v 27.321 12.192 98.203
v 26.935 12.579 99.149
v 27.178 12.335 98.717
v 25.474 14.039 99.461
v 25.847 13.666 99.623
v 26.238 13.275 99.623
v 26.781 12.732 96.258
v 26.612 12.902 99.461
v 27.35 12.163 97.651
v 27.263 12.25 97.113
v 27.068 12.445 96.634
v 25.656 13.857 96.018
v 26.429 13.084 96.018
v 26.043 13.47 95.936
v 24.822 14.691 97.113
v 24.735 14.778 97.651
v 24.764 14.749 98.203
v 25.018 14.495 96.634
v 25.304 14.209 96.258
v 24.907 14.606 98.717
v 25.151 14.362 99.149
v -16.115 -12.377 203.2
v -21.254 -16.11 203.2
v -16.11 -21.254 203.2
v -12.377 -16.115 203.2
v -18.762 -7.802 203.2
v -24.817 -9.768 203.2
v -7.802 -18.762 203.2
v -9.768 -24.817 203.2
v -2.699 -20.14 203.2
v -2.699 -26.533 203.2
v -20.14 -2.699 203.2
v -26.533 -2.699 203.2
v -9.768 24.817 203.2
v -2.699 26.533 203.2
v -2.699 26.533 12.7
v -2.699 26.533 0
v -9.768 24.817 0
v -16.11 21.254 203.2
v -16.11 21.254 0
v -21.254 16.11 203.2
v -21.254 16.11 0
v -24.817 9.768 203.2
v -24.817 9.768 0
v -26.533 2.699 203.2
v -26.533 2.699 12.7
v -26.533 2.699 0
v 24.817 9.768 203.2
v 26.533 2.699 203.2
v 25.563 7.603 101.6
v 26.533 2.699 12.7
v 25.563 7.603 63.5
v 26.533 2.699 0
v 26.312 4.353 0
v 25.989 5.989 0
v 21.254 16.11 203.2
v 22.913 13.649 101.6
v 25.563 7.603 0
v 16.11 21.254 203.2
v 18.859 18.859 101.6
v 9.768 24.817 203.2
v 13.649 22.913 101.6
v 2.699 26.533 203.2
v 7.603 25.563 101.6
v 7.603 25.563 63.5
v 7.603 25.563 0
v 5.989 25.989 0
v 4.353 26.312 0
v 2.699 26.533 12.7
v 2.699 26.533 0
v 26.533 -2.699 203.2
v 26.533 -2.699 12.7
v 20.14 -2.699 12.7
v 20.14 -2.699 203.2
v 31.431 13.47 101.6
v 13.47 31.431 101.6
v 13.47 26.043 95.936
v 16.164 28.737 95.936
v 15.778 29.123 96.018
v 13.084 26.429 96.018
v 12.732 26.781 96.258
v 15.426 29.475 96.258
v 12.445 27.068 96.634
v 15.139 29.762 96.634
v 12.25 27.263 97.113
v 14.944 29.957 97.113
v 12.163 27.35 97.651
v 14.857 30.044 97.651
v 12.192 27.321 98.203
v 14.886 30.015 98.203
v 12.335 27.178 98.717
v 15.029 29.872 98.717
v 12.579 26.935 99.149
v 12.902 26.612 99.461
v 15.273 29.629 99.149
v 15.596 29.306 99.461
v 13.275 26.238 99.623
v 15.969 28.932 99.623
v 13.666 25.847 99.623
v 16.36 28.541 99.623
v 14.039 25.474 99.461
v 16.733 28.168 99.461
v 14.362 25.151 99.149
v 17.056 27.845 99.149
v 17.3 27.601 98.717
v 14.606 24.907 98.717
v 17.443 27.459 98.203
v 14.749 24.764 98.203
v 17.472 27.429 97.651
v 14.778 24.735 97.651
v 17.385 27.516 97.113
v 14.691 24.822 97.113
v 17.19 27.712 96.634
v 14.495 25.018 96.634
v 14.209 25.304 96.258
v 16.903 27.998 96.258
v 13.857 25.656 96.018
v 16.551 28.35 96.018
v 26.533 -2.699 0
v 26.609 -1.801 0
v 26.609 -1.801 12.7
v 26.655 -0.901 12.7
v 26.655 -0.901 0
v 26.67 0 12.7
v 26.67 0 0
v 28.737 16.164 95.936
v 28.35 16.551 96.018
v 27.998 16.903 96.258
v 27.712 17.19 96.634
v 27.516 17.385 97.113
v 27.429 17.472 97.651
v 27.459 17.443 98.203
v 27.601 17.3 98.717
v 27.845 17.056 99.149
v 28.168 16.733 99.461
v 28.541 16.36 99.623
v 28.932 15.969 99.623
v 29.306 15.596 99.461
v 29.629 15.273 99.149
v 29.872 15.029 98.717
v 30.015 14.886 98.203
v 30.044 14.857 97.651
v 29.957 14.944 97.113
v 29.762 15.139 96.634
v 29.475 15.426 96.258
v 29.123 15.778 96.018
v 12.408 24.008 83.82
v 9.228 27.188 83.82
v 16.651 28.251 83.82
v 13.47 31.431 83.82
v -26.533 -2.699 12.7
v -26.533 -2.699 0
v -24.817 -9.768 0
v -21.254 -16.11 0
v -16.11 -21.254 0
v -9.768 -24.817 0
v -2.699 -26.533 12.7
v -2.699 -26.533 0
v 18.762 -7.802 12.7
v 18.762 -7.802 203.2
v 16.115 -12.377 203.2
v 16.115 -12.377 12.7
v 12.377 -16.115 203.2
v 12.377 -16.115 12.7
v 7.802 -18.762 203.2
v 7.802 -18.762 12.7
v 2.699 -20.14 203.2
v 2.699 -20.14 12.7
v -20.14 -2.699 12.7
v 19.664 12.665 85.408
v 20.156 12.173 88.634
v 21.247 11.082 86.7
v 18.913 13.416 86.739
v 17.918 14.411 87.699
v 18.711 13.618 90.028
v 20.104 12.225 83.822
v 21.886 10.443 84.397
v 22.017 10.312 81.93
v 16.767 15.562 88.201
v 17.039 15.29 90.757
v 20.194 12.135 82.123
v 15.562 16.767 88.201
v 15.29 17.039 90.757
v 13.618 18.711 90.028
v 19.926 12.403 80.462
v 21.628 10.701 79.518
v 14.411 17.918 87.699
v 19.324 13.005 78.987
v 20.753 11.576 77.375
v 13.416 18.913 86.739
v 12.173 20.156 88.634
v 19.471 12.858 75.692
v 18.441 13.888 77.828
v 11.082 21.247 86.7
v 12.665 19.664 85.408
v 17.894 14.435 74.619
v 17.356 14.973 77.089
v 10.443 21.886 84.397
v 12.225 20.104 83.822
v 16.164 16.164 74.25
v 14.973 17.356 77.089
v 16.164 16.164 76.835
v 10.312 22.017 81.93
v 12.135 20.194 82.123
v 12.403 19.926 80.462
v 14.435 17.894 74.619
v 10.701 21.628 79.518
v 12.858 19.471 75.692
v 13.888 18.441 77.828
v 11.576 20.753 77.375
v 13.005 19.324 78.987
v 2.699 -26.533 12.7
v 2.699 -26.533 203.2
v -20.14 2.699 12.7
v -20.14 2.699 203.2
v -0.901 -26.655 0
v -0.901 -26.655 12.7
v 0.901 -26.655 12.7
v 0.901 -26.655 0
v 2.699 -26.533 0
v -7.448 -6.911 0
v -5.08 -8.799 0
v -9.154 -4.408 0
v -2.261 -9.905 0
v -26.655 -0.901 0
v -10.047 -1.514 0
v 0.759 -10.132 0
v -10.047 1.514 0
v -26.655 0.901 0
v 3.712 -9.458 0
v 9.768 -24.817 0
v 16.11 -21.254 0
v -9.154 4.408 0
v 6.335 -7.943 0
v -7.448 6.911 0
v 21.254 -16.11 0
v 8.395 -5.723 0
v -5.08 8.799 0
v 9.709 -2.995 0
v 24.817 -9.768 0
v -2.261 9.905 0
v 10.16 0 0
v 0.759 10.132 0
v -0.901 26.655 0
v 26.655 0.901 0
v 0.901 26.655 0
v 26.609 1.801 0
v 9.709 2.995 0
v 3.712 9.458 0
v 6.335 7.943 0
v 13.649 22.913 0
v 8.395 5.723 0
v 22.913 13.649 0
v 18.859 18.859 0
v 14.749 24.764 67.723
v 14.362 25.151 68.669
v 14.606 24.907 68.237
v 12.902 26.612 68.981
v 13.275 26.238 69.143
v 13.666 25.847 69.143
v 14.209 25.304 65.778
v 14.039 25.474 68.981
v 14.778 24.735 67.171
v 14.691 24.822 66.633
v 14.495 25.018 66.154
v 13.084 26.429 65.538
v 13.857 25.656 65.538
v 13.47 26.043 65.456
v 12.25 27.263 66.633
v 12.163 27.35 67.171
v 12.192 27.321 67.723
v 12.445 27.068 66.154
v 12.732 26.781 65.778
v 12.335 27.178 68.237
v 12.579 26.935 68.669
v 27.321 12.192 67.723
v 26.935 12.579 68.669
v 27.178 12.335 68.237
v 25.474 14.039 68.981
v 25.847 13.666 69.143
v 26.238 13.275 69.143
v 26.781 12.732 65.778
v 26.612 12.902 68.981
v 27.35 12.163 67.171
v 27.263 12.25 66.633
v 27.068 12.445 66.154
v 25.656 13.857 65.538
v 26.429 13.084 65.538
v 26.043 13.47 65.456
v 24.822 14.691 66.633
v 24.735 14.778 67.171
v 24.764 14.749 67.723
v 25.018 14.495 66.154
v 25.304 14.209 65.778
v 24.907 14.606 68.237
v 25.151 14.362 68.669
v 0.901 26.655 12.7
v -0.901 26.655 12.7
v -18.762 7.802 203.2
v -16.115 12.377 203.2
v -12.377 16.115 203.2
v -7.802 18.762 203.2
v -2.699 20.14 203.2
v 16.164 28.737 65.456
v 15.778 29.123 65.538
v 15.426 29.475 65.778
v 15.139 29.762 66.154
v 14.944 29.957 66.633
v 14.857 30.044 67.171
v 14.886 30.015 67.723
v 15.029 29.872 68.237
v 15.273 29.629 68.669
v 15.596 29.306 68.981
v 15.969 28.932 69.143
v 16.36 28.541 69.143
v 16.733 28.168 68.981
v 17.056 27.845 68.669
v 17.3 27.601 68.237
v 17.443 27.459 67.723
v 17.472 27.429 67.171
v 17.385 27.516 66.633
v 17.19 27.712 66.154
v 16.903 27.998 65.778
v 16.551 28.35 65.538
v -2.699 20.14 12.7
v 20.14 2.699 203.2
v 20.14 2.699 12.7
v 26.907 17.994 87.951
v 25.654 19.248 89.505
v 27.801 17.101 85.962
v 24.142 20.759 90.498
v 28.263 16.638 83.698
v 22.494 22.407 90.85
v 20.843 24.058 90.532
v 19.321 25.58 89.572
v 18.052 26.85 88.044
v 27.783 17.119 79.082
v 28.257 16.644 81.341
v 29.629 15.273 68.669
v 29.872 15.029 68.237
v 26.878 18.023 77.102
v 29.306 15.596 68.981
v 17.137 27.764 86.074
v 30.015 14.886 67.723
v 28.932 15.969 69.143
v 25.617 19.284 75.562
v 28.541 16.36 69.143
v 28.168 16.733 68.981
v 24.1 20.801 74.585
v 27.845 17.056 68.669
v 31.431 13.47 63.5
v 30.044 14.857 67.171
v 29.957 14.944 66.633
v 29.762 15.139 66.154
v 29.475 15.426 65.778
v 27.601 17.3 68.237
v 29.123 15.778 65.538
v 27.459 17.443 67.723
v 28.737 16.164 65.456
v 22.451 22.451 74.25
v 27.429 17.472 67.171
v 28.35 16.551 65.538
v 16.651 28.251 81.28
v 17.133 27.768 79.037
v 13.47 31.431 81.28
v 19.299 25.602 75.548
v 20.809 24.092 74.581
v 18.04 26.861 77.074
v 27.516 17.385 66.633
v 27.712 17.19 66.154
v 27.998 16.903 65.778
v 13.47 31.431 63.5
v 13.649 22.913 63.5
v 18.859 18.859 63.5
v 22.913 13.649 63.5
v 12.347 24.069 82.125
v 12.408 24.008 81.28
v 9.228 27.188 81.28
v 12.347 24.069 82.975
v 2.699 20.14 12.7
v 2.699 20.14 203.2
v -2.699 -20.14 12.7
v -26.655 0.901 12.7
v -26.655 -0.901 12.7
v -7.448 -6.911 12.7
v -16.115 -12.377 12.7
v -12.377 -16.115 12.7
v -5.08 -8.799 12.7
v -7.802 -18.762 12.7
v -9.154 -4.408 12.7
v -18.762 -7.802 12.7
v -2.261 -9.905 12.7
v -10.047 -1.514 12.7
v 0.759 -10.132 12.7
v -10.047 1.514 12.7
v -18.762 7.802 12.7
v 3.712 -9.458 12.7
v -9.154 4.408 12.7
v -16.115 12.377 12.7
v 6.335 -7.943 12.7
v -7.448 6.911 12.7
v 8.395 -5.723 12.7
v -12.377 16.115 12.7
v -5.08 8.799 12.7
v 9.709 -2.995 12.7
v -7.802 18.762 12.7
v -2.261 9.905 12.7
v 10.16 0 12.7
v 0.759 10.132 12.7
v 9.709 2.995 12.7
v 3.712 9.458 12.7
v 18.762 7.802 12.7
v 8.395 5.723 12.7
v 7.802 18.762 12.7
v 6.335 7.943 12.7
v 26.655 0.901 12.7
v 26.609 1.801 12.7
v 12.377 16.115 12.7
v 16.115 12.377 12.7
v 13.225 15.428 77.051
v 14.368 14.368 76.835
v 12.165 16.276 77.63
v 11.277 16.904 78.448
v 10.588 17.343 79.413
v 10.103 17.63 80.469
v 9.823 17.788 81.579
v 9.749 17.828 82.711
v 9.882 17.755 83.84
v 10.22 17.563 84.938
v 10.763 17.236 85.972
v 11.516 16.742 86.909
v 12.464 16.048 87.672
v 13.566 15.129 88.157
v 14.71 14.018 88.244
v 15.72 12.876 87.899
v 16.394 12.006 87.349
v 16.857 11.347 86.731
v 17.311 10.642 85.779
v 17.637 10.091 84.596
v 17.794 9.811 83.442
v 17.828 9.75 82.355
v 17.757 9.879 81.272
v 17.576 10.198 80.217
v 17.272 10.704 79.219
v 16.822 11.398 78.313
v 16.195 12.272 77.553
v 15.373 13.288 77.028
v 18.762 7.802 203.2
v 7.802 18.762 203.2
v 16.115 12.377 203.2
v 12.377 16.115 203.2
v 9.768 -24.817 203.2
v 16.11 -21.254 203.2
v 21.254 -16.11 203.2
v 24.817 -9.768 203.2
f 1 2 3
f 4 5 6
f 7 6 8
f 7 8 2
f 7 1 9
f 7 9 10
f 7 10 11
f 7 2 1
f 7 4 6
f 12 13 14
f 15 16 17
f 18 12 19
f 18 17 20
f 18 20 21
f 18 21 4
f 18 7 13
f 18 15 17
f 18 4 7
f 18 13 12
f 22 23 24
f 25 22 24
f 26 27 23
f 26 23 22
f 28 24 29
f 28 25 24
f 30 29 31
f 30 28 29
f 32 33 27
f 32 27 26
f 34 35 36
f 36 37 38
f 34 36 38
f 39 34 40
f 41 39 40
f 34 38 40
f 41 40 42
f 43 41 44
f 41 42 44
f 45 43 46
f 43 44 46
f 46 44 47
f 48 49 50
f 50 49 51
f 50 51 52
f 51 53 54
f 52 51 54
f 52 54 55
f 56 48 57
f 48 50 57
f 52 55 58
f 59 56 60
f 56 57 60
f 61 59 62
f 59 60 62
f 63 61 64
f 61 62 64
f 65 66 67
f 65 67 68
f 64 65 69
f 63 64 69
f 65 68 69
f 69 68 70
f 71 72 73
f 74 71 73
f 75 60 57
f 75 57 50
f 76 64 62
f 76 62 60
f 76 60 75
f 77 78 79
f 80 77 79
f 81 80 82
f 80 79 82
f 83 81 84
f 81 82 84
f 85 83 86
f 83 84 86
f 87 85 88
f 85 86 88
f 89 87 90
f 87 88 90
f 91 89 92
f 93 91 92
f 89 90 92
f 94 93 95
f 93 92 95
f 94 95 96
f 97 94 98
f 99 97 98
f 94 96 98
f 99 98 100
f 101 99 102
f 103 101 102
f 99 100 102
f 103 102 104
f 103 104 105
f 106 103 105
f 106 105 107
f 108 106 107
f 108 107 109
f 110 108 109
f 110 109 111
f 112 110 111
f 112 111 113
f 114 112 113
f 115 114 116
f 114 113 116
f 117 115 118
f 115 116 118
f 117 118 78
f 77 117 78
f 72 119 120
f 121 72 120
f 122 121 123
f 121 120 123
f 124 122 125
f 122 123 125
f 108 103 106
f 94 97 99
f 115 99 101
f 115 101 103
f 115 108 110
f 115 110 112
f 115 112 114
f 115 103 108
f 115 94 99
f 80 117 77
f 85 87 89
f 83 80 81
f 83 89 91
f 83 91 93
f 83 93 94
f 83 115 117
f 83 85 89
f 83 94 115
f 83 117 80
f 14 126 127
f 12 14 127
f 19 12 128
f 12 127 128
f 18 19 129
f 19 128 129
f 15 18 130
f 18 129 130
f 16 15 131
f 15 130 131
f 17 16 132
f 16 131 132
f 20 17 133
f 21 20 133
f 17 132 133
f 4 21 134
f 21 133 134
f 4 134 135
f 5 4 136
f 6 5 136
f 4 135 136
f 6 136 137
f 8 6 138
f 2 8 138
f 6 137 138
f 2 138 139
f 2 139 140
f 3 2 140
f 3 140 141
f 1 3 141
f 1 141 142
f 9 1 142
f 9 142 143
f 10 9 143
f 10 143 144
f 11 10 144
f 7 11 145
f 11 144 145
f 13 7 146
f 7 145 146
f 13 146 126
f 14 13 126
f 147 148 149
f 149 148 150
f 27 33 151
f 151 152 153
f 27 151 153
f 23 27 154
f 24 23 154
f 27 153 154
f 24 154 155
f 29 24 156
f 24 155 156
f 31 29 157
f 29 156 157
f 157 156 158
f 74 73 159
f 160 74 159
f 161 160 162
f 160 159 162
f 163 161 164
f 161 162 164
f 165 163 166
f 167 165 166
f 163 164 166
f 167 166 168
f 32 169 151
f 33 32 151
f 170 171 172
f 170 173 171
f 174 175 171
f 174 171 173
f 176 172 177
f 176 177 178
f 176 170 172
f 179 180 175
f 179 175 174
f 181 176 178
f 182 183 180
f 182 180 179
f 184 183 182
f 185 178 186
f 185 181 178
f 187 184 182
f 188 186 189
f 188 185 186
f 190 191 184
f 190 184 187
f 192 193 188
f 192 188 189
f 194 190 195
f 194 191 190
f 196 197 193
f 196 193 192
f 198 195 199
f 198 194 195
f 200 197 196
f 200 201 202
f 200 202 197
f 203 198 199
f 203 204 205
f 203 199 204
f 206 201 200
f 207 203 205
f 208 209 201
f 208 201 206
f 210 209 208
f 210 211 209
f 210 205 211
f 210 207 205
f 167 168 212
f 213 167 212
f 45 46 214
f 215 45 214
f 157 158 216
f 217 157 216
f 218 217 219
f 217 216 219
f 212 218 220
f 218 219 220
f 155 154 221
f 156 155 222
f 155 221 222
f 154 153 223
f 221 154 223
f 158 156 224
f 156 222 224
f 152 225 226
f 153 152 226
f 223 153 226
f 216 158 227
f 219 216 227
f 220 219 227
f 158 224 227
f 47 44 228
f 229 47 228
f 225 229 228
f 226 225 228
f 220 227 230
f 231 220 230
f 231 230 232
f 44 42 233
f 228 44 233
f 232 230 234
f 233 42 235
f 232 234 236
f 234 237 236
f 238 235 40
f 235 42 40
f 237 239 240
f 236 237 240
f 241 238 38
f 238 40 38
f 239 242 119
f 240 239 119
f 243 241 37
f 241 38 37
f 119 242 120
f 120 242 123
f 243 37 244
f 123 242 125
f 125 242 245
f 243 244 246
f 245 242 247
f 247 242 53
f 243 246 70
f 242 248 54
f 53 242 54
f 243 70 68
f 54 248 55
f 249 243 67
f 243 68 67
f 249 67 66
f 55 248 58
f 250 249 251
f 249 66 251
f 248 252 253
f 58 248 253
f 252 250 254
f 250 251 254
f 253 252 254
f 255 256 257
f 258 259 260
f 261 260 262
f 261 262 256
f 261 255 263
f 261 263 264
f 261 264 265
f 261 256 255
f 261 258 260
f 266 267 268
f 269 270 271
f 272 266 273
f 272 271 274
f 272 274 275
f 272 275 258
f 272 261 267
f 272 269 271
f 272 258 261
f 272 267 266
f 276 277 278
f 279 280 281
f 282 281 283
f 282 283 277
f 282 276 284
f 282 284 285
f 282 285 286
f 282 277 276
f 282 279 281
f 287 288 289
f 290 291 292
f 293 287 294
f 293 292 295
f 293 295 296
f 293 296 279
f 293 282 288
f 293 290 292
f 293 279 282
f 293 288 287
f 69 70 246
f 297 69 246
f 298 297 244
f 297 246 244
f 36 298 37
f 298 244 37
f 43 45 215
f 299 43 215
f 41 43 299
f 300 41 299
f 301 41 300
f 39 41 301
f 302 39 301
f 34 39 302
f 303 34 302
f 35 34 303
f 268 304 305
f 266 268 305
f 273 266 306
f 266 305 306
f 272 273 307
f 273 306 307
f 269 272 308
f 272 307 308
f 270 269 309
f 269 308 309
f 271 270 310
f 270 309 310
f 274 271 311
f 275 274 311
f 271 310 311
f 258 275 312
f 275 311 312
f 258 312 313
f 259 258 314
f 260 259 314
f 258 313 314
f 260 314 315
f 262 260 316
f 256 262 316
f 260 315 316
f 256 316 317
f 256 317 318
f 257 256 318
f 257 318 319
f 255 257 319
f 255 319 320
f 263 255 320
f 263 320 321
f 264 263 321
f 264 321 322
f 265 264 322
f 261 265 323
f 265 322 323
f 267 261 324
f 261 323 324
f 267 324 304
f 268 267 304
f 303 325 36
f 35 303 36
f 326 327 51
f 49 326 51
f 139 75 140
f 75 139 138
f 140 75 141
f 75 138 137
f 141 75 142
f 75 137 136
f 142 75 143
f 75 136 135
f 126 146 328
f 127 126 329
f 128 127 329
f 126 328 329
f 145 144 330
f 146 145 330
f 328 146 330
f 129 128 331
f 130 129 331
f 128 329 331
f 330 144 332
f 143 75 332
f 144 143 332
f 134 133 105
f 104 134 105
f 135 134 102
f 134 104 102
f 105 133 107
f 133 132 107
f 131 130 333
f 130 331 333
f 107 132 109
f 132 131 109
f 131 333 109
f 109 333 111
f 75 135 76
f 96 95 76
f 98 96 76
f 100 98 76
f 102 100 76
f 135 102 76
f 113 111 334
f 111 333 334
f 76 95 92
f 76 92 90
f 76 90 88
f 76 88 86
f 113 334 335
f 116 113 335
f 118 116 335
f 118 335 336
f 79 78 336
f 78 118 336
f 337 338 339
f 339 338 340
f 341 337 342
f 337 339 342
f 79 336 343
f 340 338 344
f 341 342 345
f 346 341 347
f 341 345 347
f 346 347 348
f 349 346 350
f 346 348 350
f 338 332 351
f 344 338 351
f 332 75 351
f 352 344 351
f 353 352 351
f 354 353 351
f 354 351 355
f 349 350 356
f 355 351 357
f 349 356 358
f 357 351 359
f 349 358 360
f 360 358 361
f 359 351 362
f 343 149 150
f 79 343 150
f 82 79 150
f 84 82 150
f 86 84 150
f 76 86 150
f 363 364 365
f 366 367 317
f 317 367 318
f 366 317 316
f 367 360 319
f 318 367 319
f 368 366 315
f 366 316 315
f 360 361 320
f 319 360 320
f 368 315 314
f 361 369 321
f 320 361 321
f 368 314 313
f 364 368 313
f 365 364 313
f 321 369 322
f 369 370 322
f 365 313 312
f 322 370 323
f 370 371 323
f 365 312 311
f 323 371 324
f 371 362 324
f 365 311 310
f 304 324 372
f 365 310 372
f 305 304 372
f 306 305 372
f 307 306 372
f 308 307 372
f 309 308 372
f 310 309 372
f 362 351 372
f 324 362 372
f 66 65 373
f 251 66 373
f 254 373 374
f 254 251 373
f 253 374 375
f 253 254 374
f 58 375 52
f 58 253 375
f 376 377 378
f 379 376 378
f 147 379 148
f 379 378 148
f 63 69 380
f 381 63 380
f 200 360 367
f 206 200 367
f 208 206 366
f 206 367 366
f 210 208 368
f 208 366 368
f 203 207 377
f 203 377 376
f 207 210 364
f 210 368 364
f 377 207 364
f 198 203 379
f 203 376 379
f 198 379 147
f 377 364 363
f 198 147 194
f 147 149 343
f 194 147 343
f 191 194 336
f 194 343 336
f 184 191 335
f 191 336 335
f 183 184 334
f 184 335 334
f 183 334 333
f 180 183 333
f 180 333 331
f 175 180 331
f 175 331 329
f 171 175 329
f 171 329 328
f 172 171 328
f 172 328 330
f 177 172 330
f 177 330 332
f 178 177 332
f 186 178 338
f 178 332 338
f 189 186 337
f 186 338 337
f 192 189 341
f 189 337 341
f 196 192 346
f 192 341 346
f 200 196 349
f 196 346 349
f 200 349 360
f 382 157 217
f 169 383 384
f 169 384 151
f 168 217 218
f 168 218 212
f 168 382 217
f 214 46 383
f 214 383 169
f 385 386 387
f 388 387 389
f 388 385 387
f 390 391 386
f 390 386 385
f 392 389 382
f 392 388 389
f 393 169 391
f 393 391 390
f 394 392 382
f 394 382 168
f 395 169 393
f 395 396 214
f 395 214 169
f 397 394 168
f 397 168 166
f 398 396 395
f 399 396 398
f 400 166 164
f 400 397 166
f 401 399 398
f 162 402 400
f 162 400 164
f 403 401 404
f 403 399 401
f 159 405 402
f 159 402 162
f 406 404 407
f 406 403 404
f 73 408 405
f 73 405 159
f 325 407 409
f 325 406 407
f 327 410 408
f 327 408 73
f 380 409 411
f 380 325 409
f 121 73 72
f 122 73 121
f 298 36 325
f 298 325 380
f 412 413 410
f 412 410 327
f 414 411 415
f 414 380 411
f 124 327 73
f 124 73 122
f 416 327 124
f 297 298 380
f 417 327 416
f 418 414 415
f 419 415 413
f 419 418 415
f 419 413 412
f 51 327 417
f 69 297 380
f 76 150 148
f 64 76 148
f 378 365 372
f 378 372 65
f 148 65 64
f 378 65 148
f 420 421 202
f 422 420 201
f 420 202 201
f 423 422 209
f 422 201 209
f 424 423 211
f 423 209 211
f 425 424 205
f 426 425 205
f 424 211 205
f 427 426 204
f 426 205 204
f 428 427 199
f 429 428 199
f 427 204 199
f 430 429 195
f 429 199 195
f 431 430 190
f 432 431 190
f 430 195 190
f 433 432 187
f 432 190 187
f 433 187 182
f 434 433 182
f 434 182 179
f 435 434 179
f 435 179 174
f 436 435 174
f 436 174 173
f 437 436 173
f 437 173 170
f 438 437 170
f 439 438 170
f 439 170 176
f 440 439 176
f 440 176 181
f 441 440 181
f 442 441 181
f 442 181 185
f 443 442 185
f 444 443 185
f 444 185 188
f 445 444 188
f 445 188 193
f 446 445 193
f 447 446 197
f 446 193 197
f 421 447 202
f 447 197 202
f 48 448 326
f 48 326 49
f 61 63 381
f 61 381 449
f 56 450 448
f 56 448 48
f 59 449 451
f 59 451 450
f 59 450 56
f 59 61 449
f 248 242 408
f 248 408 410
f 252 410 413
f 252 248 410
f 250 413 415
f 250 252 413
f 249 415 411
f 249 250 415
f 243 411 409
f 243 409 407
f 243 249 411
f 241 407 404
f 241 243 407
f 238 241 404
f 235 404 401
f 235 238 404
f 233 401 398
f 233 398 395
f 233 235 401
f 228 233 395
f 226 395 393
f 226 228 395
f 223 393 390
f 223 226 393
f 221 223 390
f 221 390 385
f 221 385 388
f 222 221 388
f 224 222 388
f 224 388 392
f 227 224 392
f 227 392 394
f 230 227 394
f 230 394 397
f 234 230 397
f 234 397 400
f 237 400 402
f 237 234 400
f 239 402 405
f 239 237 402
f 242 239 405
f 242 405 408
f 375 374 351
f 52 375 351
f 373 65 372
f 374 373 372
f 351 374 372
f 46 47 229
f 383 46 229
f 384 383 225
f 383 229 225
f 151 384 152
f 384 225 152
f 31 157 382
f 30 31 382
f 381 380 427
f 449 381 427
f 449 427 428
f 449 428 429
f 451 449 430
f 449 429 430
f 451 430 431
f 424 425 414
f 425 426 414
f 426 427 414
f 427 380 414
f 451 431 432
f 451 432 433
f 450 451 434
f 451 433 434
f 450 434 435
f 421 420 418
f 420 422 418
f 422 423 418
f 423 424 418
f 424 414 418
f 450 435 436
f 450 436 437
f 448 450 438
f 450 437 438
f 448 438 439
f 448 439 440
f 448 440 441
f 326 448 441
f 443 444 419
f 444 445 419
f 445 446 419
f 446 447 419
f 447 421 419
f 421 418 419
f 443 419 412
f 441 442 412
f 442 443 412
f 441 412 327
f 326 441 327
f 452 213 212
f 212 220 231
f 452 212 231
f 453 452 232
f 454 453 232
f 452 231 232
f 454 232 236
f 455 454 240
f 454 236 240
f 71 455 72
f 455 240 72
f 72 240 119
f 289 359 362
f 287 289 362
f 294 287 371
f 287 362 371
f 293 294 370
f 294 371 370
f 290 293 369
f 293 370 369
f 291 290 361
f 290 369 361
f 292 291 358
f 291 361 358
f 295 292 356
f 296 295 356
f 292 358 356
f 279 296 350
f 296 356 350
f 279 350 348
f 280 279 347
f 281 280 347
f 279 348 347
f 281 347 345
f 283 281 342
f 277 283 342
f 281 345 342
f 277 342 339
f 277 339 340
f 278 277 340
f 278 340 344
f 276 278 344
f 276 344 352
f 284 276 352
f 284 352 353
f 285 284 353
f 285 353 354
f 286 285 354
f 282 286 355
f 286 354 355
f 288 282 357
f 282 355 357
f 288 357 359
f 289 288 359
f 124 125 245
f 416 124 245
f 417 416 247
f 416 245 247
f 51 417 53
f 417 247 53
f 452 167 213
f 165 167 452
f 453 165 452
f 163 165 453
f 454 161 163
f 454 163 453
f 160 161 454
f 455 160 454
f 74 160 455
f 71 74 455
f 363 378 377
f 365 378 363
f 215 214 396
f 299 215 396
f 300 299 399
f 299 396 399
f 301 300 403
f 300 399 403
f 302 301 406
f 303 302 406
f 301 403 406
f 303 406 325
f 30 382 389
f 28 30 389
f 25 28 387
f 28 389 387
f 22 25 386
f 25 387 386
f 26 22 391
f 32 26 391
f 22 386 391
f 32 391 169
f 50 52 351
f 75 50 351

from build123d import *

# Parameters (mm, degrees)
BOSS_EXTRUDE2_DEPTH   = 203.2
BOSS_EXTRUDE2_2_DEPTH = 203.2
BOSS_EXTRUDE2_3_DEPTH = 203.2
BOSS_EXTRUDE2_4_DEPTH = 203.2
SKETCH1_15_R          = 26.67
SKETCH1_15_R_2        = 10.16
BOSS_EXTRUDE3_DEPTH   = 12.7
BOSS_EXTRUDE4_DEPTH   = 101.6
CUT_EXTRUDE2_DEPTH    = 63.5
SKETCH4_R             = 8.300000037
CUT_EXTRUDE3_DEPTH    = 8.89
SKETCH5_R             = 5.715
CUT_EXTRUDE5_DEPTH    = 25.4
SKETCH7_W             = 2.54
SKETCH7_H             = 6
CUT_EXTRUDE6_DEPTH    = 8.89
SKETCH8_R             = 1.8542
CUT_EXTRUDE7_DEPTH    = 3.81


with BuildPart() as part:
    # Sketch1 → Boss-Extrude2 (new body)
    with BuildSketch(Plane.XY):
        with BuildLine():
            Line((-26.533104764, 2.69875), (-20.139988789, 2.69875))
            ThreePointArc((-20.139988789, 2.69875), (-14.368409794, 14.368409794), (-2.69875, 20.139988789))
            Line((-2.69875, 20.139988789), (-2.69875, 26.533104764))
            ThreePointArc((-2.69875, 26.533104764), (-18.858537854, 18.858537854), (-26.533104764, 2.69875))
        make_face()
    extrude(amount=BOSS_EXTRUDE2_DEPTH)



with BuildPart() as body_2:
    # Sketch1 → Boss-Extrude2 2 (new body)
    with BuildSketch(Plane.XY):
        with BuildLine():
            ThreePointArc((-2.69875, -20.139988789), (-14.368409794, -14.368409794), (-20.139988789, -2.69875))
            Line((-20.139988789, -2.69875), (-26.533104764, -2.69875))
            ThreePointArc((-26.533104764, -2.69875), (-18.858537854, -18.858537854), (-2.69875, -26.533104764))
            Line((-2.69875, -26.533104764), (-2.69875, -20.139988789))
        make_face()
    extrude(amount=BOSS_EXTRUDE2_2_DEPTH)


with BuildPart() as body_3:
    # Sketch1 → Boss-Extrude2 3 (new body)
    with BuildSketch(Plane.XY):
        with BuildLine():
            Line((2.69875, 26.533104764), (2.69875, 20.139988789))
            ThreePointArc((2.69875, 20.139988789), (14.368409794, 14.368409794), (20.139988789, 2.69875))
            Line((20.139988789, 2.69875), (26.533104764, 2.69875))
            ThreePointArc((26.533104764, 2.69875), (18.858537854, 18.858537854), (2.69875, 26.533104764))
        make_face()
    extrude(amount=BOSS_EXTRUDE2_3_DEPTH)


with BuildPart() as body_4:
    # Sketch1 → Boss-Extrude2 4 (new body)
    with BuildSketch(Plane.XY):
        with BuildLine():
            ThreePointArc((20.139988789, -2.69875), (14.368409794, -14.368409794), (2.69875, -20.139988789))
            Line((2.69875, -20.139988789), (2.69875, -26.533104764))
            ThreePointArc((2.69875, -26.533104764), (18.858537854, -18.858537854), (26.533104764, -2.69875))
            Line((26.533104764, -2.69875), (20.139988789, -2.69875))
        make_face()
    extrude(amount=BOSS_EXTRUDE2_4_DEPTH)


with BuildPart() as part_1:
    add(part.part)

    add(body_2.part)  # Boss-Extrude3 merges body 2

    add(body_3.part)  # Boss-Extrude3 merges body 3

    add(body_4.part)  # Boss-Extrude3 merges body 4
    # Sketch1<15> → Boss-Extrude3 (add)
    with BuildSketch(Plane.XY):
        Circle(SKETCH1_15_R)
        Circle(SKETCH1_15_R_2, mode=Mode.SUBTRACT)
    extrude(amount=BOSS_EXTRUDE3_DEPTH)

    # Sketch1<18> → Boss-Extrude4 (add)
    with BuildSketch(Plane.XY):
        with BuildLine():
            Line((13.470384182, 31.430896424), (7.602851248, 25.56336349))
            ThreePointArc((7.602851248, 25.56336349), (18.858537854, 18.858537854), (25.56336349, 7.602851248))
            Line((25.56336349, 7.602851248), (31.430896424, 13.470384182))
            Line((31.430896424, 13.470384182), (13.470384182, 31.430896424))
        make_face()
    extrude(amount=BOSS_EXTRUDE4_DEPTH)

    # Sketch1<19> → Cut-Extrude2 (cut)
    with BuildSketch(Plane.XY):
        with BuildLine():
            Line((13.470384182, 31.430896424), (7.602851248, 25.56336349))
            ThreePointArc((7.602851248, 25.56336349), (18.858537854, 18.858537854), (25.56336349, 7.602851248))
            Line((25.56336349, 7.602851248), (31.430896424, 13.470384182))
            Line((31.430896424, 13.470384182), (13.470384182, 31.430896424))
        make_face()
    extrude(amount=CUT_EXTRUDE2_DEPTH, mode=Mode.SUBTRACT)

    # Sketch4 → Cut-Extrude3 (cut)
    with BuildSketch(Plane(origin=(22.450640303, 22.450640303, 0), x_dir=(0, 0, -1), z_dir=(0.7071067811865466, 0.7071067811865485, 0))):
        with Locations((-82.55, 0)):
            Circle(SKETCH4_R)
    extrude(amount=-CUT_EXTRUDE3_DEPTH, mode=Mode.SUBTRACT)

    # Sketch5 → Cut-Extrude5 (cut)
    with BuildSketch(Plane(origin=(22.450640303, 22.450640303, 0), x_dir=(0, 0, -1), z_dir=(0.7071067811865466, 0.7071067811865485, 0))):
        with Locations((-82.55, 0)):
            Circle(SKETCH5_R)
    extrude(amount=-CUT_EXTRUDE5_DEPTH, mode=Mode.SUBTRACT)

    # Sketch7 → Cut-Extrude6 (cut)
    with BuildSketch(Plane(origin=(-8.980256121, 8.980256121, 0), x_dir=(0, 0, 1), z_dir=(-0.7071067811865488, 0.7071067811865462, 0))):
        with Locations((82.55, 28.75)):
            Rectangle(SKETCH7_W, SKETCH7_H)
    extrude(amount=-CUT_EXTRUDE6_DEPTH, mode=Mode.SUBTRACT)

    # Sketch8 → Cut-Extrude7 (cut)
    with BuildSketch(Plane(origin=(22.450640303, 22.450640303, 0), x_dir=(0, 0, -1), z_dir=(0.7071067811865466, 0.7071067811865485, 0))):
        with Locations((-97.79, 8.89)):
            Circle(SKETCH8_R)
        with Locations((-97.79, -8.89)):
            Circle(SKETCH8_R)
        with Locations((-67.31, -8.89)):
            Circle(SKETCH8_R)
        with Locations((-67.31, 8.89)):
            Circle(SKETCH8_R)
    extrude(amount=-CUT_EXTRUDE7_DEPTH, mode=Mode.SUBTRACT)


solid = part_1.part
